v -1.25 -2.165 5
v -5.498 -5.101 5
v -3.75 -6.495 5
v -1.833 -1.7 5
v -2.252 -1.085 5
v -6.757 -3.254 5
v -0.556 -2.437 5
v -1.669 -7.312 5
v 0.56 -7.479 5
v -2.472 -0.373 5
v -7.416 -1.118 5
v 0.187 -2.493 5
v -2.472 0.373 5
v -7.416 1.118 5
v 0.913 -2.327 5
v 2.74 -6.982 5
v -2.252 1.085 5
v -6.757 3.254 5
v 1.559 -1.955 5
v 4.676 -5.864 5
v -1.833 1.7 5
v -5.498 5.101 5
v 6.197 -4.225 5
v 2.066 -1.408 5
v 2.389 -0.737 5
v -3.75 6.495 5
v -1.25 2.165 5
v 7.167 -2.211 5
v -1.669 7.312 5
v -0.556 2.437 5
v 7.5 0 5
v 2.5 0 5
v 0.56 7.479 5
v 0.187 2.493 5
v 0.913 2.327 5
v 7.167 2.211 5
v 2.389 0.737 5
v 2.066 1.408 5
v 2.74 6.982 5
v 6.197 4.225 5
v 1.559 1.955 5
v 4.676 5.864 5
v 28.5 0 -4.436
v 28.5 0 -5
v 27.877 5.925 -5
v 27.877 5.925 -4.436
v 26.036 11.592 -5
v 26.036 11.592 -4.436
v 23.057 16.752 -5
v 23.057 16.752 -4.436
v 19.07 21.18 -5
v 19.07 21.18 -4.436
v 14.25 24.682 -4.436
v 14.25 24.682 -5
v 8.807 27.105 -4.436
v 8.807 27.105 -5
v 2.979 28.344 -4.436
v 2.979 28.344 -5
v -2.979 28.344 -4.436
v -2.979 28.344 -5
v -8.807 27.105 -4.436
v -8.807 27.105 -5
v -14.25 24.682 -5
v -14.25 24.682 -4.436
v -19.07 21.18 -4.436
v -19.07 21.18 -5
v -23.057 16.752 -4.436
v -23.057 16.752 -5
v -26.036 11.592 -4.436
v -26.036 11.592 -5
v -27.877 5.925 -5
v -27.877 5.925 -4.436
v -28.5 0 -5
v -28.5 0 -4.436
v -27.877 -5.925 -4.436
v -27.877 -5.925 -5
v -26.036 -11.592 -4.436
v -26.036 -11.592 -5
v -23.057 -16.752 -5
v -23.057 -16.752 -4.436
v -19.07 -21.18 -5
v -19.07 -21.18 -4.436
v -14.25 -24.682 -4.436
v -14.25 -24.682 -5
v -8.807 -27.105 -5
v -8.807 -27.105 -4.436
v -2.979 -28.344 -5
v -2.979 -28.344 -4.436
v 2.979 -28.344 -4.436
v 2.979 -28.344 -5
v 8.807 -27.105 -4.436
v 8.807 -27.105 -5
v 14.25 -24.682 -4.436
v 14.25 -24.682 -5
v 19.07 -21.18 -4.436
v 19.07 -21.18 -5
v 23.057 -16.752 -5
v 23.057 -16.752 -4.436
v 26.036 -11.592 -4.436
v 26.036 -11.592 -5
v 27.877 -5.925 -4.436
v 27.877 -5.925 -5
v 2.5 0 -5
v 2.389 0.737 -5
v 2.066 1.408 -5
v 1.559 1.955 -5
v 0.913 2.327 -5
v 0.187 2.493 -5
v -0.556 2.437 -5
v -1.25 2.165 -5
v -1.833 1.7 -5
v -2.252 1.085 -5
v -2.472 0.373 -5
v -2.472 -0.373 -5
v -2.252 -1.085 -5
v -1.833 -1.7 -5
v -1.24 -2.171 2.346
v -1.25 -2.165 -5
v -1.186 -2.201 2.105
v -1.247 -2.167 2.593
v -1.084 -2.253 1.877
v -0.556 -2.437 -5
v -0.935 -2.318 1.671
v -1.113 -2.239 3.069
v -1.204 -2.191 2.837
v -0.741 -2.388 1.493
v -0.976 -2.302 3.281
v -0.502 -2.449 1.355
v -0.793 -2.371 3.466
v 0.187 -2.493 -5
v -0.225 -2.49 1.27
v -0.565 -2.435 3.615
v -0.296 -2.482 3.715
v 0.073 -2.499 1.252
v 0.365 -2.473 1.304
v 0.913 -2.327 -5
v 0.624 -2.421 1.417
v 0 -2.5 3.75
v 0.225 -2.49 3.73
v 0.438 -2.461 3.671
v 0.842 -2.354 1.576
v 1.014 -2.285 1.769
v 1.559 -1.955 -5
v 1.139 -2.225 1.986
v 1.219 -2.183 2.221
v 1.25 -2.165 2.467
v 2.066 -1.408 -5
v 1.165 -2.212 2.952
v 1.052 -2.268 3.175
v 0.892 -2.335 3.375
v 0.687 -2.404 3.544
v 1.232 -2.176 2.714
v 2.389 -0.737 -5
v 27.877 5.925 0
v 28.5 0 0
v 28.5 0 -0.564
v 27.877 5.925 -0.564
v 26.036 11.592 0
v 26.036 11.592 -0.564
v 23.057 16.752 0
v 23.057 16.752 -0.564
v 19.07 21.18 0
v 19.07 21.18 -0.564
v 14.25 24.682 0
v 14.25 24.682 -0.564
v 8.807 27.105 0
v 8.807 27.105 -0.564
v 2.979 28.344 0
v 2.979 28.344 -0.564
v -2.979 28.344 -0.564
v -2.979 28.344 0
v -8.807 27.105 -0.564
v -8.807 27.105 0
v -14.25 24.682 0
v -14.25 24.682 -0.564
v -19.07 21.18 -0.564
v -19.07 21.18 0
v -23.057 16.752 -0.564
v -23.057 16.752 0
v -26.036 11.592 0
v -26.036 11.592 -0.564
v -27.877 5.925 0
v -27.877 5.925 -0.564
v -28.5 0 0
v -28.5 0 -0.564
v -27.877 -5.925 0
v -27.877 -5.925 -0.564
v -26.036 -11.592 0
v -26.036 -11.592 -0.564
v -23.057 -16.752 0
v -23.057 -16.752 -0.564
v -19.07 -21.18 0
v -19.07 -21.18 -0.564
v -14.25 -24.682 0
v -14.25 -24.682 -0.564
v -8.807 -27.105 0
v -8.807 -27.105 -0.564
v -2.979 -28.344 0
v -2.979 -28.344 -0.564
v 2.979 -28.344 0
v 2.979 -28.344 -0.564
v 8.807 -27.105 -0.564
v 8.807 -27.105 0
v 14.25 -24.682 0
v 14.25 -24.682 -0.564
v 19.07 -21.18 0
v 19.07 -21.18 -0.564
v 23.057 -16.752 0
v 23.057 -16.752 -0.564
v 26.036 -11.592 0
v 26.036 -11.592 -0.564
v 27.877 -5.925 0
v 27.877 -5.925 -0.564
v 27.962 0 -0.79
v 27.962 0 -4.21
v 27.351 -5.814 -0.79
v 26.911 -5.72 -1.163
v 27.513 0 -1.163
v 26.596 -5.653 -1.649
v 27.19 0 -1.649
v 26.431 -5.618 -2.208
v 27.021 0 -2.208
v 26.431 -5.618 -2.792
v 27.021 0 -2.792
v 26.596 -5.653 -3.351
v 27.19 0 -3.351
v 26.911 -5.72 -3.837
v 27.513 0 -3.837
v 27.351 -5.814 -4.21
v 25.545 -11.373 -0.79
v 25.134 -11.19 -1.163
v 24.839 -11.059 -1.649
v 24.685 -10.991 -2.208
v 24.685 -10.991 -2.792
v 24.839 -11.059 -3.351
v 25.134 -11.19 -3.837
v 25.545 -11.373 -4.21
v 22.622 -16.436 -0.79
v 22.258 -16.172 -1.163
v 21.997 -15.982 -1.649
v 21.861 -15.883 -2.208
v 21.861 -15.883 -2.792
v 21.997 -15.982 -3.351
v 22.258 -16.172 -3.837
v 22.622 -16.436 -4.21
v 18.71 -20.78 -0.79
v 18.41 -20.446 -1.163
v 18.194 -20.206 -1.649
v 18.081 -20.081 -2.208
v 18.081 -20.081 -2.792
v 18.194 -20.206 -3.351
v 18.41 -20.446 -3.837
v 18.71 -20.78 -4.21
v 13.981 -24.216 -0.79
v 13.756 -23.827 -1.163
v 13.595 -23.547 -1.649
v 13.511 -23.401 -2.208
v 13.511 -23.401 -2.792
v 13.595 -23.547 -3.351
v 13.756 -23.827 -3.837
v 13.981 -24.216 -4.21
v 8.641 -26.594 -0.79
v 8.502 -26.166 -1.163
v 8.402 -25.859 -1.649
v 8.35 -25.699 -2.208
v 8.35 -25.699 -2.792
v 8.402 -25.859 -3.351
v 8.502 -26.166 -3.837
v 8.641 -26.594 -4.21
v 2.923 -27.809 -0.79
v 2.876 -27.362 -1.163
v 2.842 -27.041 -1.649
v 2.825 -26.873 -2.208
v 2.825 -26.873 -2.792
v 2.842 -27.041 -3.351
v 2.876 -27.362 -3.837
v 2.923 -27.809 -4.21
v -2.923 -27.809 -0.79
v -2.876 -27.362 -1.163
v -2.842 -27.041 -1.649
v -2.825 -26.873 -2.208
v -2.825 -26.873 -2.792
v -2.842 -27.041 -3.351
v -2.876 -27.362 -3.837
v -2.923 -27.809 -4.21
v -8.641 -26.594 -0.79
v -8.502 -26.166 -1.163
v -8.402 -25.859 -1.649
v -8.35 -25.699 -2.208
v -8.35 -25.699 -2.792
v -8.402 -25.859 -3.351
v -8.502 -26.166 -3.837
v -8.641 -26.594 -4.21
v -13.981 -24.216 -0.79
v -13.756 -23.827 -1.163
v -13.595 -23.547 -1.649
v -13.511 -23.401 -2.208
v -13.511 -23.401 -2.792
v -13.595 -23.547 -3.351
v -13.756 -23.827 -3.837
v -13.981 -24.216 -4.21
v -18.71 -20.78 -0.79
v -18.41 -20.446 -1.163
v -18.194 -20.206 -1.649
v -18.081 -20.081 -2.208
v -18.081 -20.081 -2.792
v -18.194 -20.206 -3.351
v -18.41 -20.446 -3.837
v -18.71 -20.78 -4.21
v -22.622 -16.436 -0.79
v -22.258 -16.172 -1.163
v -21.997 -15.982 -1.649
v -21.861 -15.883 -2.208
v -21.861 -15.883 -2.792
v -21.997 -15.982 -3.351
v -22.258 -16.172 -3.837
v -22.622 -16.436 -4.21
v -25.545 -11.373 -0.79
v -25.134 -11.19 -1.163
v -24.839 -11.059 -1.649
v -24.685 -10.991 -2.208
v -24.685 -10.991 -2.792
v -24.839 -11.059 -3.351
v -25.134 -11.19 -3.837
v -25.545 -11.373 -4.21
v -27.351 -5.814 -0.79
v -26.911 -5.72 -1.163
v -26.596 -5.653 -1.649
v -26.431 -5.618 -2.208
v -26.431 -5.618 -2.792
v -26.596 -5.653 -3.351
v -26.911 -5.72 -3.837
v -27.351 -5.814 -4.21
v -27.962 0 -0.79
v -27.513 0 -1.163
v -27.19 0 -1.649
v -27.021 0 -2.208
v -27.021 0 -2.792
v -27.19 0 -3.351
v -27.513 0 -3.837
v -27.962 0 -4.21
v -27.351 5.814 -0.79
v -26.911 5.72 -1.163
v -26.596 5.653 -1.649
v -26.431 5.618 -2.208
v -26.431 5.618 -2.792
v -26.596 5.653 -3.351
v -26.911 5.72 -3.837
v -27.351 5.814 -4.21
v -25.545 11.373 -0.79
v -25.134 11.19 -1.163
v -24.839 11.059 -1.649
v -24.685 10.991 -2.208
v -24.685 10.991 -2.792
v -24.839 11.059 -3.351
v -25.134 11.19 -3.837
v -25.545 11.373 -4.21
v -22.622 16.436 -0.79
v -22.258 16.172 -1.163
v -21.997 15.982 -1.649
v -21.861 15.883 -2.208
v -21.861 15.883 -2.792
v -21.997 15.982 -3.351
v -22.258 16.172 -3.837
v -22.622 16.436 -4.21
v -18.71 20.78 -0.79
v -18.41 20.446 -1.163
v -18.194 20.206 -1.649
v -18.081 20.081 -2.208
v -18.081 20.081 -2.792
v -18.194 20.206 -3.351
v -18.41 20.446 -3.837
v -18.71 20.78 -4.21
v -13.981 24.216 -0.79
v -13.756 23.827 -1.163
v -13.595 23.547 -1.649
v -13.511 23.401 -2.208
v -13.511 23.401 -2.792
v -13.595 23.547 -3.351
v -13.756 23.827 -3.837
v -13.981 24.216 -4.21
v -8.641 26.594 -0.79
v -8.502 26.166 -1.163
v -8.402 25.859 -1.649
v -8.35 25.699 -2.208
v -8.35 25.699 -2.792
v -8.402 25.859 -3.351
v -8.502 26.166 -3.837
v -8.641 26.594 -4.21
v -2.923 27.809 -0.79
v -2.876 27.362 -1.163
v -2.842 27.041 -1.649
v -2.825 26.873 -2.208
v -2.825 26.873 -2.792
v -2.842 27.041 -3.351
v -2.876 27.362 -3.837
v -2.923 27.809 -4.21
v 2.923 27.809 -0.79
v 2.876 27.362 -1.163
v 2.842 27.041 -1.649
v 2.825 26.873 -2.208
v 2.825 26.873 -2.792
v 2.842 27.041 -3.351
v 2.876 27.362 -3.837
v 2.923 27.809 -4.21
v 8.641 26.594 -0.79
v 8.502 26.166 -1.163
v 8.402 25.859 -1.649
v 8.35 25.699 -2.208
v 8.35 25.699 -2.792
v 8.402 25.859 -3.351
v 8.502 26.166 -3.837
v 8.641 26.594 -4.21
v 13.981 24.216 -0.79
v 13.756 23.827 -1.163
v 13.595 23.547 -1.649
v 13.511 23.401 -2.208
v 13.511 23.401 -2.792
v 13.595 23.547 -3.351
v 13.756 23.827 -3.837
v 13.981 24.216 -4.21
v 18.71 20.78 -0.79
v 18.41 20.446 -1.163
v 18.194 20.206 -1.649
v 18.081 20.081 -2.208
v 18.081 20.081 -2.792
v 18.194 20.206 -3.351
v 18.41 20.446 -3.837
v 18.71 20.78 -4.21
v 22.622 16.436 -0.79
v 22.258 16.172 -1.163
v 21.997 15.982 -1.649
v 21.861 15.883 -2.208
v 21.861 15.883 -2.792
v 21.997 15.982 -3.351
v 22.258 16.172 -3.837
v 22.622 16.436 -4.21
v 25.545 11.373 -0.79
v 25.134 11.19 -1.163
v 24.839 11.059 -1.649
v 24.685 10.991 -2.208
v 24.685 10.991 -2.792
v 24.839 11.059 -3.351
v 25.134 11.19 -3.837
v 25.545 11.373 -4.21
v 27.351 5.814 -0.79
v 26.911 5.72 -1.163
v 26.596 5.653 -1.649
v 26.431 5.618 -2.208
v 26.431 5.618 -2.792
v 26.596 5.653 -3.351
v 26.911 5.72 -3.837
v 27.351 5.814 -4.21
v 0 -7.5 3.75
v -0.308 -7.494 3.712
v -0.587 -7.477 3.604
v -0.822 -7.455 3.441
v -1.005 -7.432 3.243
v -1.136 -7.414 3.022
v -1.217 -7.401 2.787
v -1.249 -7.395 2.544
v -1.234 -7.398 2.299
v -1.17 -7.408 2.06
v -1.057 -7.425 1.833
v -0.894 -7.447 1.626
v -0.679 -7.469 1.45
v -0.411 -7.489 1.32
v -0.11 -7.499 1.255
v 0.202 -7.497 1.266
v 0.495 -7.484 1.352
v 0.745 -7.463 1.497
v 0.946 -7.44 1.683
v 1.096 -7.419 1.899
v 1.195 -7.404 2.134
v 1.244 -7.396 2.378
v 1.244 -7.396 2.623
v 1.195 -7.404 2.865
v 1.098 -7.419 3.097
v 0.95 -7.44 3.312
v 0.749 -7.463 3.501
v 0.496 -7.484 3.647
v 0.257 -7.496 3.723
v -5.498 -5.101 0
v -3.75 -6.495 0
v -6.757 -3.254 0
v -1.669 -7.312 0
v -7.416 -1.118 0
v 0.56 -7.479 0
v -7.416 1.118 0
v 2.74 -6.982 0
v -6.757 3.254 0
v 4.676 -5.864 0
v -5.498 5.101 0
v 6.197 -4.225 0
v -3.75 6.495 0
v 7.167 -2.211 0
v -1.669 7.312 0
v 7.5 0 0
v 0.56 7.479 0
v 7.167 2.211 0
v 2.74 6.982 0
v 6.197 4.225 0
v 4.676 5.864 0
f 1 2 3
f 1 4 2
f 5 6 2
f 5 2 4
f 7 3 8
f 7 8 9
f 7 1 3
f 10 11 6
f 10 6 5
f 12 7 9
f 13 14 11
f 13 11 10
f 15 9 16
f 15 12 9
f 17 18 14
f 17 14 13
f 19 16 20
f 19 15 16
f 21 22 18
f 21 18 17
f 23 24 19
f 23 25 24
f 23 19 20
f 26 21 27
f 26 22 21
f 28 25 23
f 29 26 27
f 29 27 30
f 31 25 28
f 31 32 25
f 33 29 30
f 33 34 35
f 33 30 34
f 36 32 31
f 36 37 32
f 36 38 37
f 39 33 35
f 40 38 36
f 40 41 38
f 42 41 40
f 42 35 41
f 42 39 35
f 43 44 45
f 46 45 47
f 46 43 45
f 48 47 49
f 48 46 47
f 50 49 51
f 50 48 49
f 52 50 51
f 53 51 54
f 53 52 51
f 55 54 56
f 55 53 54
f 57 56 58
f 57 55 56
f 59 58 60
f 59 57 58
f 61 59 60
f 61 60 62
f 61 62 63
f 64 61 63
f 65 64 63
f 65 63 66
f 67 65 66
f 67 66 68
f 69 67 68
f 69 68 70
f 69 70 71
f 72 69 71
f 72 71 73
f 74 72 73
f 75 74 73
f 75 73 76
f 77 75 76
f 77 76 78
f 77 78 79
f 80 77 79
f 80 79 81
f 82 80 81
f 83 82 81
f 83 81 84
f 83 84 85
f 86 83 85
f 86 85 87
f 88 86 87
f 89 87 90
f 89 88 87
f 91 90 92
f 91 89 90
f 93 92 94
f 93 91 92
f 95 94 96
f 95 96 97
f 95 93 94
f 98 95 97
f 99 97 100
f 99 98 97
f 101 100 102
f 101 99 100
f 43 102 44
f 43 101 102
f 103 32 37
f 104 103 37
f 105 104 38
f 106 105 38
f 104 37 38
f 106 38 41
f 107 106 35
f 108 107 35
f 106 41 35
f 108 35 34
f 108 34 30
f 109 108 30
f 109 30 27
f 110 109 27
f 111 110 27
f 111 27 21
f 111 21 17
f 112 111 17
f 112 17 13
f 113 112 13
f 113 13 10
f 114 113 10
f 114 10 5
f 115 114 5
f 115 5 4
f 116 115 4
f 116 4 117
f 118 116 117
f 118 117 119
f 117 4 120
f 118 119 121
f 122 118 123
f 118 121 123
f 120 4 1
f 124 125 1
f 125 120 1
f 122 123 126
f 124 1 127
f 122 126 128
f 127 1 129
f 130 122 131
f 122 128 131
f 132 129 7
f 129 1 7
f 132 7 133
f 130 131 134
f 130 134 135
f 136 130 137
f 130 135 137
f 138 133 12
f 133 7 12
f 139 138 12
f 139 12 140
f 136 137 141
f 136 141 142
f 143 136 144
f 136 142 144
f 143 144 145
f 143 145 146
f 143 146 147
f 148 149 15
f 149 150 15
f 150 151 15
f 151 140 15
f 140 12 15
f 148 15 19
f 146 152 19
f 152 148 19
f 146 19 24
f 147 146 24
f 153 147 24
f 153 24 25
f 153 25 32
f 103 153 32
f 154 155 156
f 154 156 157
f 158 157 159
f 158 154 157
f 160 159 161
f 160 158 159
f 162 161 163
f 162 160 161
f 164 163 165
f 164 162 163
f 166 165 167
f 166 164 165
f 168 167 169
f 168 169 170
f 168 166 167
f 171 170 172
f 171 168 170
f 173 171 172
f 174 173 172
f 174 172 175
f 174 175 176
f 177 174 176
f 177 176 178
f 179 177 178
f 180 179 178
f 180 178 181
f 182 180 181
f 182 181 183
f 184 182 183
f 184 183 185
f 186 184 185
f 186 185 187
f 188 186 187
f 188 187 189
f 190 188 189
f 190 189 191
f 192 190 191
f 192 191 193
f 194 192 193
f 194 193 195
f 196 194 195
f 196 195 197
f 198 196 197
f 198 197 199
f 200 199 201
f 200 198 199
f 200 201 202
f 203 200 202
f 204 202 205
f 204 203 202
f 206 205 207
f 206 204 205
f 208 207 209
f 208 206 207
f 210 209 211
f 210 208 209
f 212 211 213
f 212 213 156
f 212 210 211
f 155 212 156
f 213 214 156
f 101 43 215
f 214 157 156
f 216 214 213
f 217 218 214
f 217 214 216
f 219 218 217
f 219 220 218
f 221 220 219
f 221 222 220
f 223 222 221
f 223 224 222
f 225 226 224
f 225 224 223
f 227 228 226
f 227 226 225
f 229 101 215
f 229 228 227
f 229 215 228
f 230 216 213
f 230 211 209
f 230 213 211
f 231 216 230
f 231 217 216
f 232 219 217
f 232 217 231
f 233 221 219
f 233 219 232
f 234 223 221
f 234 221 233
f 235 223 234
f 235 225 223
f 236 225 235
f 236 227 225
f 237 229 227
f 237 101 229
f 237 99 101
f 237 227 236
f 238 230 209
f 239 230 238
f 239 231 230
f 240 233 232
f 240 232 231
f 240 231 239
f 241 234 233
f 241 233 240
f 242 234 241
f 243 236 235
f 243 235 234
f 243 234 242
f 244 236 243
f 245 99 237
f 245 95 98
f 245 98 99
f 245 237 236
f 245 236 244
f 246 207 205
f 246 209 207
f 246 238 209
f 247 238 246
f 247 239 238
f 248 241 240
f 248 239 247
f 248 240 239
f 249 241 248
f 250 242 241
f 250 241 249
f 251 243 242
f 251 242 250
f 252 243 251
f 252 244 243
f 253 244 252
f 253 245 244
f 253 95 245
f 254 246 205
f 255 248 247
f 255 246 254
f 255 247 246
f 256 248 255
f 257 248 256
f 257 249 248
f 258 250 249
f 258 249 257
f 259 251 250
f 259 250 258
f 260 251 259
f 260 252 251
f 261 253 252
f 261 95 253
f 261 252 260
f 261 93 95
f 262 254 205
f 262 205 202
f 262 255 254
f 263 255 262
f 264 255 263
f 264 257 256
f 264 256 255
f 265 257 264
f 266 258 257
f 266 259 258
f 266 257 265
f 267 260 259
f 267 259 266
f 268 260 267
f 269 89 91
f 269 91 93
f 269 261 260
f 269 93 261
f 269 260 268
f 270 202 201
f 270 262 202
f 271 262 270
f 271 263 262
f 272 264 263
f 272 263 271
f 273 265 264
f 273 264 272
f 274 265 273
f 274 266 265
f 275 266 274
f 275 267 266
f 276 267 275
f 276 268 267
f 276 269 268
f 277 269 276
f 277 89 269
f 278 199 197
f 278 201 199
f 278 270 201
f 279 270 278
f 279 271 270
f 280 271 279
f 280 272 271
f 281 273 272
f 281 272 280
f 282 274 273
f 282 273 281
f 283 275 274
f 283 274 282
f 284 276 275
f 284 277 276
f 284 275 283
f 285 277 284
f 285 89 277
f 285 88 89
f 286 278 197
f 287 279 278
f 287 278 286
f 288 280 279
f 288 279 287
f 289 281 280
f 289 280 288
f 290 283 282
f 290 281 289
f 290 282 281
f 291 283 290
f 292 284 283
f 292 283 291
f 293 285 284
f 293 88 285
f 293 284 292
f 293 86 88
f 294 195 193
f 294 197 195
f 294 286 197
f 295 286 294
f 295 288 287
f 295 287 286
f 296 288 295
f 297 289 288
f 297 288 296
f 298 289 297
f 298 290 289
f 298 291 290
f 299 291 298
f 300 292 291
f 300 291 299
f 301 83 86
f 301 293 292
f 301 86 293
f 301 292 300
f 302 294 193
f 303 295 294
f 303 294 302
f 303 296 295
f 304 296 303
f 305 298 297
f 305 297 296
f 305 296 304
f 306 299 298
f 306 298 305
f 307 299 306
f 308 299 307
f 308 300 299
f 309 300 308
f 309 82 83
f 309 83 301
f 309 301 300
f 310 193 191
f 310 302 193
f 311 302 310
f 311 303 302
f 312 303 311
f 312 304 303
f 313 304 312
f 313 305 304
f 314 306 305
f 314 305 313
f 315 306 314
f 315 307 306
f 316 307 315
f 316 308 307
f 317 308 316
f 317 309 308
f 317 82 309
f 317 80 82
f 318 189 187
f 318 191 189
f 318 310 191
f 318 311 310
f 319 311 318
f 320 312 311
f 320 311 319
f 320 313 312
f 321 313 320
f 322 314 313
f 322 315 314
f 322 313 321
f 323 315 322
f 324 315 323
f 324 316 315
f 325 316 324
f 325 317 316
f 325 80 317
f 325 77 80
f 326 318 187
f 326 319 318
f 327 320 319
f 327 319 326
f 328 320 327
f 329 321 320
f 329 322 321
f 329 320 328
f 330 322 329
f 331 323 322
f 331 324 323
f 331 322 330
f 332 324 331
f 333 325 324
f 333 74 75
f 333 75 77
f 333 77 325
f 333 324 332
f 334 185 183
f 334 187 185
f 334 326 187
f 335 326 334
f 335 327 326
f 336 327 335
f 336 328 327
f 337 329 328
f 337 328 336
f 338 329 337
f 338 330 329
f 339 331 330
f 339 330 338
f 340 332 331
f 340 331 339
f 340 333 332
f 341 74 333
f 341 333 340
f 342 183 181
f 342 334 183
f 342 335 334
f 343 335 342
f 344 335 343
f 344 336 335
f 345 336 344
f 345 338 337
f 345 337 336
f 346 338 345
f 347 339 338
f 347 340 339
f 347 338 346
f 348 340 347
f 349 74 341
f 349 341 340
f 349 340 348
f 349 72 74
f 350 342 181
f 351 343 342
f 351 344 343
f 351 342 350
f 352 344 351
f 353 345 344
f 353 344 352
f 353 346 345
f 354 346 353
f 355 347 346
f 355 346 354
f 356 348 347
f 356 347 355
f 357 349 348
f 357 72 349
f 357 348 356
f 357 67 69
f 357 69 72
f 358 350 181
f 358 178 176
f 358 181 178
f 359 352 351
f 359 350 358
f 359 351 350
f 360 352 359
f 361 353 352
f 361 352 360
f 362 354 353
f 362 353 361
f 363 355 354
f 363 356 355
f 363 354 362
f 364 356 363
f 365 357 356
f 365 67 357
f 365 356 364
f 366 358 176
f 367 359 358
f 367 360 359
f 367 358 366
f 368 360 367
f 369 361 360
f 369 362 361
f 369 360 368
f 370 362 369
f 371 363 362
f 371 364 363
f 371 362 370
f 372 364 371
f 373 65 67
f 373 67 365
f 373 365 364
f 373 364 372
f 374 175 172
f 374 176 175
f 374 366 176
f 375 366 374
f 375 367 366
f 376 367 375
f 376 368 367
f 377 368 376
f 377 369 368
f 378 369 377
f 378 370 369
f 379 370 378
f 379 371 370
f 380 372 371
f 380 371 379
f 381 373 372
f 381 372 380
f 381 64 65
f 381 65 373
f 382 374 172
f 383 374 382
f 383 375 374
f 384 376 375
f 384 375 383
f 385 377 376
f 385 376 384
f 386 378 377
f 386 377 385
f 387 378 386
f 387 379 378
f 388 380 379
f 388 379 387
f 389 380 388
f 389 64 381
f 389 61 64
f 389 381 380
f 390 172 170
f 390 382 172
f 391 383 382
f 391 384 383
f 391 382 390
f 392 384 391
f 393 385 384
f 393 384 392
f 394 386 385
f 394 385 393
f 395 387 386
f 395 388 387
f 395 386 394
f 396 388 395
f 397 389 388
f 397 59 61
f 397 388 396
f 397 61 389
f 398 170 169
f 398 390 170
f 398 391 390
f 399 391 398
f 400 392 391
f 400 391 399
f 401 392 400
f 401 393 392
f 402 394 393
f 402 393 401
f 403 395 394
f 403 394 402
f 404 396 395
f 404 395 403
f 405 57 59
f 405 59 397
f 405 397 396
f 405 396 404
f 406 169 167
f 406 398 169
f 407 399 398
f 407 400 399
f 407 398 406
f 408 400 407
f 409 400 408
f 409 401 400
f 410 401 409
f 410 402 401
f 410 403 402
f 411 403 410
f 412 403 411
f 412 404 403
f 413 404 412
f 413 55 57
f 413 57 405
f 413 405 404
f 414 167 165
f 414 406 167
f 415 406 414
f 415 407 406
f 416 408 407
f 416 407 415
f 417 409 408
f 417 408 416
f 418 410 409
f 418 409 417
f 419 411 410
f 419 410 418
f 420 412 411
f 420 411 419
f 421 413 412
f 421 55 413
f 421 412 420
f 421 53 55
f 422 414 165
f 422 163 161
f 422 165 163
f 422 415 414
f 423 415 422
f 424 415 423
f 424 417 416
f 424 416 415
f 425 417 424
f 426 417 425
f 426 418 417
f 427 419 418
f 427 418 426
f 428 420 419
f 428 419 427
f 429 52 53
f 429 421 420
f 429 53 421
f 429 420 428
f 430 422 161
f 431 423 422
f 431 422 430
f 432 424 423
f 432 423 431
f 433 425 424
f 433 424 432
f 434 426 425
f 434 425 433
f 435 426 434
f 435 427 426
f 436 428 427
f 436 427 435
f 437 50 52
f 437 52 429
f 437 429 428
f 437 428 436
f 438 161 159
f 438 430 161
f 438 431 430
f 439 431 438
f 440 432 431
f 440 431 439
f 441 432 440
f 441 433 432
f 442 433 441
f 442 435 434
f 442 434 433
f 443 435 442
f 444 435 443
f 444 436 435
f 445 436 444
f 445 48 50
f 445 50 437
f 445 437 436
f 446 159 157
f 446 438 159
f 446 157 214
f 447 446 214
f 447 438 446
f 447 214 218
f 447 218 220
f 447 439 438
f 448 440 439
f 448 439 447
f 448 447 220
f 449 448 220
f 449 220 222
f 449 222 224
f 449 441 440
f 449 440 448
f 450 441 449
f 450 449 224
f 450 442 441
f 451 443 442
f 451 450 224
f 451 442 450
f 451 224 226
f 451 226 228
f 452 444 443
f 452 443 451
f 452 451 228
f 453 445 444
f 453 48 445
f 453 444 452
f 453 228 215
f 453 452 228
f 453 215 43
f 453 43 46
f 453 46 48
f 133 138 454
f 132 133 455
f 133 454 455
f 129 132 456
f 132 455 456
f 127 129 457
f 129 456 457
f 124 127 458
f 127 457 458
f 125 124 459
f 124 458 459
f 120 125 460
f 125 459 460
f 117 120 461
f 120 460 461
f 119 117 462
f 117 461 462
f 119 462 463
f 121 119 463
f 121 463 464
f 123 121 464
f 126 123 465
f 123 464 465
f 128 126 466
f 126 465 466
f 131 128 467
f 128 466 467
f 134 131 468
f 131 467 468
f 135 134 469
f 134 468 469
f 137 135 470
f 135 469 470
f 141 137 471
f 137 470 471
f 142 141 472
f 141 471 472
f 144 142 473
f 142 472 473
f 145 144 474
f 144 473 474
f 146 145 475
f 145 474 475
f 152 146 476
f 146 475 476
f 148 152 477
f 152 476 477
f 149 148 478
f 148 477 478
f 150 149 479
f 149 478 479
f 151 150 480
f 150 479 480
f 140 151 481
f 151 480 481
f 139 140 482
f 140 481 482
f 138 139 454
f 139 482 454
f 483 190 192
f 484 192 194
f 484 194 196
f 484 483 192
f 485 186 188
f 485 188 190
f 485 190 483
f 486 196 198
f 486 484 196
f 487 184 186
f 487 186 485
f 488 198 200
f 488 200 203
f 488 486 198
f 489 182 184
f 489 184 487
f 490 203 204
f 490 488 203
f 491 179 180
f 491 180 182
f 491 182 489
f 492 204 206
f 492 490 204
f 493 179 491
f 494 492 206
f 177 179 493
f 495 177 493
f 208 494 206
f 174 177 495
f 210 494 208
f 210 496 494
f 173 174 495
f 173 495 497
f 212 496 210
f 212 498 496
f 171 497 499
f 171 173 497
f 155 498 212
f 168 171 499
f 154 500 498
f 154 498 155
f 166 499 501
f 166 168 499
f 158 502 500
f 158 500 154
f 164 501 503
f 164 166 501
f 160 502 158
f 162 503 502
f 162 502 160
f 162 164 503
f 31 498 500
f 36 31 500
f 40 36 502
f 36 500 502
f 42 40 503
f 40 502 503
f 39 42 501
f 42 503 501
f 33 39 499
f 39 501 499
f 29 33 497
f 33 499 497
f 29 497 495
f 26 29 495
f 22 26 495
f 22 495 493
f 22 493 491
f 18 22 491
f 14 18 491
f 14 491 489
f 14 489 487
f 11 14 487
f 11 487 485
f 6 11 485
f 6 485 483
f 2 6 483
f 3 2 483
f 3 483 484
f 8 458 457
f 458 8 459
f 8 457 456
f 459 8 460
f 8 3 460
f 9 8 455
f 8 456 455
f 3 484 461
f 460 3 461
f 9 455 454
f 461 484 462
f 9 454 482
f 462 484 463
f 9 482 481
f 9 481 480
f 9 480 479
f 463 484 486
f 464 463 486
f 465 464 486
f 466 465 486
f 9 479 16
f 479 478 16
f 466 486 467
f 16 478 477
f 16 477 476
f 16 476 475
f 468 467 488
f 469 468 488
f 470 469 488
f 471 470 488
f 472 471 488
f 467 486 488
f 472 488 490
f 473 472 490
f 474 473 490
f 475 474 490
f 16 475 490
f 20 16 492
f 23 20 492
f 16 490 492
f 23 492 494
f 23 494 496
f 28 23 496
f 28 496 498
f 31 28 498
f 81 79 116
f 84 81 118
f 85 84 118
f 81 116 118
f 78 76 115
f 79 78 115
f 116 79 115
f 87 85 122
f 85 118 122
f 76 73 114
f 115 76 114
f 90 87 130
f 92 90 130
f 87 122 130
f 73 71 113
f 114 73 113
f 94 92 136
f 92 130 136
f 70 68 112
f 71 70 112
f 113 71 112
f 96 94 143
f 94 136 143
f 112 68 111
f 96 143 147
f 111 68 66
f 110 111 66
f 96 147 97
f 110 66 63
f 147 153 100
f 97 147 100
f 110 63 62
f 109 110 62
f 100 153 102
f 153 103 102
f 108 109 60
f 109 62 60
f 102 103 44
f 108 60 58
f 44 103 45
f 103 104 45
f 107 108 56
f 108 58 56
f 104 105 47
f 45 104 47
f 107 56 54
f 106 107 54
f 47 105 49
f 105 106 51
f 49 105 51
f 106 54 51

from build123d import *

# Parameters (mm, degrees)
ESQUISSE1_R      = 28.5
EXTRUSION1_DEPTH = 5
ESQUISSE2_R      = 7.5
EXTRUSION2_DEPTH = 5
EXTRUSION3_REACH = 43.527
ESQUISSE3_R      = 2.5
ESQUISSE12_W     = 1.25
ESQUISSE12_H     = 28.5


with BuildPart() as part:
    # Esquisse1 → Extrusion1 (new body)
    with BuildSketch(Plane.XY):
        Circle(ESQUISSE1_R)
    extrude(amount=-EXTRUSION1_DEPTH)

    # Esquisse2 → Extrusion2 (add)
    with BuildSketch(Plane.XY):
        Circle(ESQUISSE2_R)
    extrude(amount=EXTRUSION2_DEPTH)

    # Esquisse3 → Extrusion3 (cut, up to next)
    with BuildSketch(Plane.XY.offset(5), mode=Mode.PRIVATE) as extrusion3_sk1:
        Circle(ESQUISSE3_R)
    extrusion3_tool1 = extrude(extrusion3_sk1.sketch, amount=-EXTRUSION3_REACH, mode=Mode.PRIVATE) & part.part
    add(extrusion3_tool1.solids().sort_by_distance((0, 0, 5))[0], mode=Mode.SUBTRACT)

    # Esquisse6 → Enlèvement de matière-Révolution3 (revolve, cut)
    with BuildSketch(Plane(origin=(0, 0, 0), x_dir=(1, 0, 0), z_dir=(0, 1, 0)), mode=Mode.PRIVATE) as enl_vement_de_mati_re_r_volution3_sk:
        with BuildLine():
            Line((-29, 4.5), (-31.449617094, 4.5))
            Line((-31.449617094, 4.5), (-31.449617094, 0.5))
            Line((-31.449617094, 0.5), (-29, 0.5))
            ThreePointArc((-29, 0.5), (-27, 2.5), (-29, 4.5))
        make_face()
    revolve(enl_vement_de_mati_re_r_volution3_sk.sketch.rotate(Axis((0, 0, 5), (0, 0, -1)), 180), axis=Axis((0, 0, 5), (0, 0, -1)), mode=Mode.SUBTRACT)

    # Esquisse12 → Trou taraudé M3x0.55 (revolve, cut)
    with BuildSketch(Plane(origin=(0, 0, 2.5), x_dir=(0, 0, 1), z_dir=(1, 0, 0))):
        with Locations((0.625, 14.25)):
            Rectangle(ESQUISSE12_W, ESQUISSE12_H)
    revolve(axis=Axis((0, 6.35, 2.5), (0, -1, 0)), mode=Mode.SUBTRACT)


solid = part.part
